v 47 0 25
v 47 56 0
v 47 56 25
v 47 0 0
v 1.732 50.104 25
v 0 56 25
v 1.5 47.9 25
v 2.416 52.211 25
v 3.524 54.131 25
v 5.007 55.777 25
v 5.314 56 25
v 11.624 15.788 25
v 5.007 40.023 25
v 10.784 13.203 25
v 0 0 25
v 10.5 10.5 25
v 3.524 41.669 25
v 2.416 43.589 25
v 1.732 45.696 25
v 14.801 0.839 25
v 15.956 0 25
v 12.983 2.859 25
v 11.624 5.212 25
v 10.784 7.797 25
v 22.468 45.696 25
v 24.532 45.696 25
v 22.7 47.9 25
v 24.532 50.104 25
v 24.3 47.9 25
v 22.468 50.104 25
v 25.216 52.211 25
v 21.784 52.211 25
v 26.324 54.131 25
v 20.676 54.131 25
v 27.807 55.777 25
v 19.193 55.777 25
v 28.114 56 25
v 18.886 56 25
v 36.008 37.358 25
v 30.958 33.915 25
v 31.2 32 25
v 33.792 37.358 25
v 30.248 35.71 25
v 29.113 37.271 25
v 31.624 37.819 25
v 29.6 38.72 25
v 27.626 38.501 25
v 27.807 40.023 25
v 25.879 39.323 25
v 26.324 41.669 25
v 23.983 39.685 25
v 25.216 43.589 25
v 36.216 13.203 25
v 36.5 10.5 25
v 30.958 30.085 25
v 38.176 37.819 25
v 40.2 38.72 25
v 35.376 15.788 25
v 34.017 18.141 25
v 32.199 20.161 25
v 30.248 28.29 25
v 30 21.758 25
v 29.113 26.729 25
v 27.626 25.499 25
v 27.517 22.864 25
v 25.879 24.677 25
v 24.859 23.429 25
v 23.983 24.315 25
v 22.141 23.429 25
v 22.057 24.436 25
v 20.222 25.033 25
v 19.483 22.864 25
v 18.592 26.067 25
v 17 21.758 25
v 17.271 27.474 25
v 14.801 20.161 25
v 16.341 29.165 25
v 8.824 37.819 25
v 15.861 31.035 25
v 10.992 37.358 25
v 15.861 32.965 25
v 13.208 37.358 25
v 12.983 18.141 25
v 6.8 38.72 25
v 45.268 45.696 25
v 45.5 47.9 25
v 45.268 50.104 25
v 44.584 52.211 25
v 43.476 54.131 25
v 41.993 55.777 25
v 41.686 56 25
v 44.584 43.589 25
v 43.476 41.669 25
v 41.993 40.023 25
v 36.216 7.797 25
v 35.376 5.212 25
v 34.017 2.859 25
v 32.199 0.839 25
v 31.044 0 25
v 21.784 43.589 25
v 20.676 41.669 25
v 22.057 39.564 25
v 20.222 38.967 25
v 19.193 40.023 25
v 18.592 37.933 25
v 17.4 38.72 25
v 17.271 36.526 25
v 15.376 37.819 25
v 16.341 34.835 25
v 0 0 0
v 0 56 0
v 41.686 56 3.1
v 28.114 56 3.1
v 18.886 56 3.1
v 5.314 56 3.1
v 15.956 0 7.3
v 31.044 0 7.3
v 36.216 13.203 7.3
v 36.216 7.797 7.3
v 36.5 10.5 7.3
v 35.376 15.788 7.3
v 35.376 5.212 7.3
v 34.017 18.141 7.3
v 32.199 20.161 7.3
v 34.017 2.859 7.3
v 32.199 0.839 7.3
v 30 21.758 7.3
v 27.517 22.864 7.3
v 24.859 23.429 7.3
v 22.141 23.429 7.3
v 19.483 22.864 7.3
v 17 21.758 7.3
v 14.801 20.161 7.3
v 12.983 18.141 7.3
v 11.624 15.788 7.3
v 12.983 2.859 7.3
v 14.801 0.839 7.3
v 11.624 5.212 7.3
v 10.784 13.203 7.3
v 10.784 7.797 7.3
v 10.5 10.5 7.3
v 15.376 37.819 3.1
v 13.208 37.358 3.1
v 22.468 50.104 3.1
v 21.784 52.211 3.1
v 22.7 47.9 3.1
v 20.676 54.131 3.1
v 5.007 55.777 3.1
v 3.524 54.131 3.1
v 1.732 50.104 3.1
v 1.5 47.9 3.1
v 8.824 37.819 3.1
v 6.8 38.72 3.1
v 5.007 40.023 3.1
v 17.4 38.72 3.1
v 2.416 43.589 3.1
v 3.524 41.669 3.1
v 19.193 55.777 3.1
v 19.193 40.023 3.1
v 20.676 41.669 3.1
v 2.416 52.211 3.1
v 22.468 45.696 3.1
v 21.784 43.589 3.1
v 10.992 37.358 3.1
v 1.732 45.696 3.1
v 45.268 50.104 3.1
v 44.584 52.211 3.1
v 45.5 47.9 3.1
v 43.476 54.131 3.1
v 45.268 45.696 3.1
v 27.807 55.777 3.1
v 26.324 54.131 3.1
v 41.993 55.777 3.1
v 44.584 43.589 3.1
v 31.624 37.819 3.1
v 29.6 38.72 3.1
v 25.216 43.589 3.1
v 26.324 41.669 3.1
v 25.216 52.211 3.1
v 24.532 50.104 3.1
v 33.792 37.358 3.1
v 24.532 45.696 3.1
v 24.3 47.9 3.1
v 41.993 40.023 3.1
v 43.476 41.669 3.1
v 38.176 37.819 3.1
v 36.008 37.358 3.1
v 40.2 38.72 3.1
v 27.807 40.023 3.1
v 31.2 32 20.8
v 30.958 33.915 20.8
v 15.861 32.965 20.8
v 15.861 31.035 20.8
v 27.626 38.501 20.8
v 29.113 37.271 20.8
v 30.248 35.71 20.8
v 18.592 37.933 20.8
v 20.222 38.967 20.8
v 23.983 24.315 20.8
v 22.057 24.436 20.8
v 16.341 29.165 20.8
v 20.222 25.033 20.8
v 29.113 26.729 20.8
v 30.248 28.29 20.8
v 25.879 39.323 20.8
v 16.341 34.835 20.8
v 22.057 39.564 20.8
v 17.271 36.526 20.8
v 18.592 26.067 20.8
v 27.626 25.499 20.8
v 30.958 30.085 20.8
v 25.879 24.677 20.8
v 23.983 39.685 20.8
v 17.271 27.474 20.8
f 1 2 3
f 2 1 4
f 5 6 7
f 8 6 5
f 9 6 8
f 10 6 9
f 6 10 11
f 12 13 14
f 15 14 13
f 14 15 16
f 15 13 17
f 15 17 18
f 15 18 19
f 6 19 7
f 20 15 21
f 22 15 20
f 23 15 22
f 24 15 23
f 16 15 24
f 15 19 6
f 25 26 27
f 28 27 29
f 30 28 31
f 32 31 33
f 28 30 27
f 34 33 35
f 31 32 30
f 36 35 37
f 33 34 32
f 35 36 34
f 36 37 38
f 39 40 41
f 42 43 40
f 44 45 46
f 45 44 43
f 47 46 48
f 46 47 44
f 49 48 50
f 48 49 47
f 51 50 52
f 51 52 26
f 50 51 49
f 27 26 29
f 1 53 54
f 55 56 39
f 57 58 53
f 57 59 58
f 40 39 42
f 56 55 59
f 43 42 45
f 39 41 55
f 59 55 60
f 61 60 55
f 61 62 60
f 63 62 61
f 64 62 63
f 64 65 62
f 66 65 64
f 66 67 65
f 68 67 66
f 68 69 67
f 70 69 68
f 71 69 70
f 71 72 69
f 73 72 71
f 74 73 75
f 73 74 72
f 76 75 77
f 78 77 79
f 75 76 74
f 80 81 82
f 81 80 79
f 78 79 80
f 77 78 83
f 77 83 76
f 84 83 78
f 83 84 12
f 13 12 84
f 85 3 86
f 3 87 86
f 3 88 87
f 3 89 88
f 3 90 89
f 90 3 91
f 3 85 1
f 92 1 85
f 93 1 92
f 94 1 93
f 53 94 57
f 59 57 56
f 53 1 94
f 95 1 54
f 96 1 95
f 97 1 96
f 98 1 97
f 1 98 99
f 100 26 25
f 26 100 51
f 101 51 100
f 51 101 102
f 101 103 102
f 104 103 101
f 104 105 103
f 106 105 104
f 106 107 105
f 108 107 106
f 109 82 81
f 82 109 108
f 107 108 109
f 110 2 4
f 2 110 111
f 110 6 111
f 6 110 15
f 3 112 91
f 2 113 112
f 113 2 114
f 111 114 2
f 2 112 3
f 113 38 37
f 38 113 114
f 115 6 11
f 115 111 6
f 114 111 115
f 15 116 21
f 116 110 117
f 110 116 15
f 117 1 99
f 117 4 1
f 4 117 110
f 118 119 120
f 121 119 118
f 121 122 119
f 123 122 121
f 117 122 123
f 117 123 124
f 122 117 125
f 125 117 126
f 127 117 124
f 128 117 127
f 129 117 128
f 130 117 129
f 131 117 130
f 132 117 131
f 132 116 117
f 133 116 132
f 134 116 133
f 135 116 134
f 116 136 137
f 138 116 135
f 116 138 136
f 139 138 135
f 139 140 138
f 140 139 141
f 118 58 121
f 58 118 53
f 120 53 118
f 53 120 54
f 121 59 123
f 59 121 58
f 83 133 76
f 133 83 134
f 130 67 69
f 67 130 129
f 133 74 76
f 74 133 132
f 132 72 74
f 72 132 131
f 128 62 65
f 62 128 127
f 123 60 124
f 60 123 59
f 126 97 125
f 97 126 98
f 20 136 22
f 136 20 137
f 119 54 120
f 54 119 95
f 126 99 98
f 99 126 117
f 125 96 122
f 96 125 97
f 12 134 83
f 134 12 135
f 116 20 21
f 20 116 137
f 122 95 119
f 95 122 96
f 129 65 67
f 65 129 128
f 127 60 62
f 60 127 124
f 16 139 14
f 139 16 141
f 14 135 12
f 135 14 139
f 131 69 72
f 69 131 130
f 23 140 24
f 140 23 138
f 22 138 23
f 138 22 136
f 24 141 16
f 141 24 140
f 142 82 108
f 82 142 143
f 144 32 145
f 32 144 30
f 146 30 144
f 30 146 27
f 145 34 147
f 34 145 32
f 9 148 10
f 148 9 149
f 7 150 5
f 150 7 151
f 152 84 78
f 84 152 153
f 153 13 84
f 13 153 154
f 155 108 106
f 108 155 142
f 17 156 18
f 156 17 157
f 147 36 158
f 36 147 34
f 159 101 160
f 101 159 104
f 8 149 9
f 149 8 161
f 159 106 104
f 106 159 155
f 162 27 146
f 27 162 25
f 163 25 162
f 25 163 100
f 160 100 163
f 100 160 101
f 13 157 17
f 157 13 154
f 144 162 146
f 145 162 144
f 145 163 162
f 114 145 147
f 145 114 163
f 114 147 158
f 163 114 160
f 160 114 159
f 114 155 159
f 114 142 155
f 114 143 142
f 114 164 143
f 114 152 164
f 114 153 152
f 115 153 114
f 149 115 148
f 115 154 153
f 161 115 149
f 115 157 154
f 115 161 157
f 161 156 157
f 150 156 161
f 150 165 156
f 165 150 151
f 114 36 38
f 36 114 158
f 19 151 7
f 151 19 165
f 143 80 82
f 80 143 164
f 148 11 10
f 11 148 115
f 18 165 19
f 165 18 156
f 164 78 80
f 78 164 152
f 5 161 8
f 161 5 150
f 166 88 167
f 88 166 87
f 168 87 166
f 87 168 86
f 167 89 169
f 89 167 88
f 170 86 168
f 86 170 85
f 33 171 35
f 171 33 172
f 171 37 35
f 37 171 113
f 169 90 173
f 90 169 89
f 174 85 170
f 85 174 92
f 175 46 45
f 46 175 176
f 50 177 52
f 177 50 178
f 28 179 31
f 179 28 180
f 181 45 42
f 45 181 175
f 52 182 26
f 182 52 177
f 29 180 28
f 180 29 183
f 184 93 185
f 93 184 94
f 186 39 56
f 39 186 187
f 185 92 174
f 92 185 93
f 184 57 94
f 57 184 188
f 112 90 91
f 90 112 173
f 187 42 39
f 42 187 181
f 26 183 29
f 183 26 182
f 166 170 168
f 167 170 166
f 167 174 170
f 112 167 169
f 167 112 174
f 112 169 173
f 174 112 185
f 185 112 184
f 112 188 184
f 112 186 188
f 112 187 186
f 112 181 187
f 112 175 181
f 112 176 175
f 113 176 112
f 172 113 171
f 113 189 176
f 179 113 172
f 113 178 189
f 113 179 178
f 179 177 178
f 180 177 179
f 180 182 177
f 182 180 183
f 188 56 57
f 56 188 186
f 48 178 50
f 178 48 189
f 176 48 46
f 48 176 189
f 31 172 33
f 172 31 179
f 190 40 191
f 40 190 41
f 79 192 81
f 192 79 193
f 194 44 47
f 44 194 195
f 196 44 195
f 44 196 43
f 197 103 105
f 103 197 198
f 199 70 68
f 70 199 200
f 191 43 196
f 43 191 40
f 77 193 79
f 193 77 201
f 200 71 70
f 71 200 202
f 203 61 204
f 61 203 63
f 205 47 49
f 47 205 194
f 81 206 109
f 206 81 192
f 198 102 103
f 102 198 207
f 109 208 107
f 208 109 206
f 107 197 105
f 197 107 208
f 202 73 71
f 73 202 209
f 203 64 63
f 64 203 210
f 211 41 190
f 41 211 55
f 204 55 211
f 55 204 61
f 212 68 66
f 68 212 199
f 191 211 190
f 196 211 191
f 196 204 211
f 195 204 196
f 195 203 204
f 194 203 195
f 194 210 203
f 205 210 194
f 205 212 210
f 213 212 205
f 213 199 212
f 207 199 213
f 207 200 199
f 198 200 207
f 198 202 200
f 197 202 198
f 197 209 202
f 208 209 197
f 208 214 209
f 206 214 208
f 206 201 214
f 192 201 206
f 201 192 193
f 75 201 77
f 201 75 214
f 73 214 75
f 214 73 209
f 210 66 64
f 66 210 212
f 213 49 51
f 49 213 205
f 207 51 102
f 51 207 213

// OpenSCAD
length = 47; 
width = 56;
//height = 24;
height = 25;

floorThickness = 3;

//Based on magnet size:
magnetBaseOuterDiameter = 20;
magnetBaseInnerDiameter = 15.4;

magnetHeight = 4.2;

//fiftyCoinHeight = 16.4 + .5;
fiftyCoinHeight = 17.2 + .5;
//fiftyCoinHeight = 17.8 + .5;

//oneCoinSecondHeight = 20.3 + .5;
oneCoinSecondHeight = 21.4 + .5;
//oneCoinSecondHeight = 22.1 + .5;


coinOffset = 2.5;
fiftyCoinDiameter = 25 + 1;
oneCoinDiameter = 20.2 + 1;

spaceBetweenCircles = 1.5;

difference(){
    cube([length, width, height]);

    translate([length/2, fiftyCoinDiameter/2 - coinOffset, height - fiftyCoinHeight])
        cylinder(fiftyCoinHeight, d=fiftyCoinDiameter);

    
  
    
    translate([oneCoinDiameter/2 + spaceBetweenCircles, width - (oneCoinDiameter/2 - coinOffset), height - oneCoinSecondHeight])
        cylinder(oneCoinSecondHeight, d=oneCoinDiameter);
    
    translate([length - (oneCoinDiameter/2 + spaceBetweenCircles), width - (oneCoinDiameter/2 - coinOffset), height - oneCoinSecondHeight])
        cylinder(oneCoinSecondHeight, d=oneCoinDiameter);

  
    translate([length/2, width/2 + 4, height - magnetHeight])
        cylinder(magnetHeight, d=magnetBaseInnerDiameter);
        

}
